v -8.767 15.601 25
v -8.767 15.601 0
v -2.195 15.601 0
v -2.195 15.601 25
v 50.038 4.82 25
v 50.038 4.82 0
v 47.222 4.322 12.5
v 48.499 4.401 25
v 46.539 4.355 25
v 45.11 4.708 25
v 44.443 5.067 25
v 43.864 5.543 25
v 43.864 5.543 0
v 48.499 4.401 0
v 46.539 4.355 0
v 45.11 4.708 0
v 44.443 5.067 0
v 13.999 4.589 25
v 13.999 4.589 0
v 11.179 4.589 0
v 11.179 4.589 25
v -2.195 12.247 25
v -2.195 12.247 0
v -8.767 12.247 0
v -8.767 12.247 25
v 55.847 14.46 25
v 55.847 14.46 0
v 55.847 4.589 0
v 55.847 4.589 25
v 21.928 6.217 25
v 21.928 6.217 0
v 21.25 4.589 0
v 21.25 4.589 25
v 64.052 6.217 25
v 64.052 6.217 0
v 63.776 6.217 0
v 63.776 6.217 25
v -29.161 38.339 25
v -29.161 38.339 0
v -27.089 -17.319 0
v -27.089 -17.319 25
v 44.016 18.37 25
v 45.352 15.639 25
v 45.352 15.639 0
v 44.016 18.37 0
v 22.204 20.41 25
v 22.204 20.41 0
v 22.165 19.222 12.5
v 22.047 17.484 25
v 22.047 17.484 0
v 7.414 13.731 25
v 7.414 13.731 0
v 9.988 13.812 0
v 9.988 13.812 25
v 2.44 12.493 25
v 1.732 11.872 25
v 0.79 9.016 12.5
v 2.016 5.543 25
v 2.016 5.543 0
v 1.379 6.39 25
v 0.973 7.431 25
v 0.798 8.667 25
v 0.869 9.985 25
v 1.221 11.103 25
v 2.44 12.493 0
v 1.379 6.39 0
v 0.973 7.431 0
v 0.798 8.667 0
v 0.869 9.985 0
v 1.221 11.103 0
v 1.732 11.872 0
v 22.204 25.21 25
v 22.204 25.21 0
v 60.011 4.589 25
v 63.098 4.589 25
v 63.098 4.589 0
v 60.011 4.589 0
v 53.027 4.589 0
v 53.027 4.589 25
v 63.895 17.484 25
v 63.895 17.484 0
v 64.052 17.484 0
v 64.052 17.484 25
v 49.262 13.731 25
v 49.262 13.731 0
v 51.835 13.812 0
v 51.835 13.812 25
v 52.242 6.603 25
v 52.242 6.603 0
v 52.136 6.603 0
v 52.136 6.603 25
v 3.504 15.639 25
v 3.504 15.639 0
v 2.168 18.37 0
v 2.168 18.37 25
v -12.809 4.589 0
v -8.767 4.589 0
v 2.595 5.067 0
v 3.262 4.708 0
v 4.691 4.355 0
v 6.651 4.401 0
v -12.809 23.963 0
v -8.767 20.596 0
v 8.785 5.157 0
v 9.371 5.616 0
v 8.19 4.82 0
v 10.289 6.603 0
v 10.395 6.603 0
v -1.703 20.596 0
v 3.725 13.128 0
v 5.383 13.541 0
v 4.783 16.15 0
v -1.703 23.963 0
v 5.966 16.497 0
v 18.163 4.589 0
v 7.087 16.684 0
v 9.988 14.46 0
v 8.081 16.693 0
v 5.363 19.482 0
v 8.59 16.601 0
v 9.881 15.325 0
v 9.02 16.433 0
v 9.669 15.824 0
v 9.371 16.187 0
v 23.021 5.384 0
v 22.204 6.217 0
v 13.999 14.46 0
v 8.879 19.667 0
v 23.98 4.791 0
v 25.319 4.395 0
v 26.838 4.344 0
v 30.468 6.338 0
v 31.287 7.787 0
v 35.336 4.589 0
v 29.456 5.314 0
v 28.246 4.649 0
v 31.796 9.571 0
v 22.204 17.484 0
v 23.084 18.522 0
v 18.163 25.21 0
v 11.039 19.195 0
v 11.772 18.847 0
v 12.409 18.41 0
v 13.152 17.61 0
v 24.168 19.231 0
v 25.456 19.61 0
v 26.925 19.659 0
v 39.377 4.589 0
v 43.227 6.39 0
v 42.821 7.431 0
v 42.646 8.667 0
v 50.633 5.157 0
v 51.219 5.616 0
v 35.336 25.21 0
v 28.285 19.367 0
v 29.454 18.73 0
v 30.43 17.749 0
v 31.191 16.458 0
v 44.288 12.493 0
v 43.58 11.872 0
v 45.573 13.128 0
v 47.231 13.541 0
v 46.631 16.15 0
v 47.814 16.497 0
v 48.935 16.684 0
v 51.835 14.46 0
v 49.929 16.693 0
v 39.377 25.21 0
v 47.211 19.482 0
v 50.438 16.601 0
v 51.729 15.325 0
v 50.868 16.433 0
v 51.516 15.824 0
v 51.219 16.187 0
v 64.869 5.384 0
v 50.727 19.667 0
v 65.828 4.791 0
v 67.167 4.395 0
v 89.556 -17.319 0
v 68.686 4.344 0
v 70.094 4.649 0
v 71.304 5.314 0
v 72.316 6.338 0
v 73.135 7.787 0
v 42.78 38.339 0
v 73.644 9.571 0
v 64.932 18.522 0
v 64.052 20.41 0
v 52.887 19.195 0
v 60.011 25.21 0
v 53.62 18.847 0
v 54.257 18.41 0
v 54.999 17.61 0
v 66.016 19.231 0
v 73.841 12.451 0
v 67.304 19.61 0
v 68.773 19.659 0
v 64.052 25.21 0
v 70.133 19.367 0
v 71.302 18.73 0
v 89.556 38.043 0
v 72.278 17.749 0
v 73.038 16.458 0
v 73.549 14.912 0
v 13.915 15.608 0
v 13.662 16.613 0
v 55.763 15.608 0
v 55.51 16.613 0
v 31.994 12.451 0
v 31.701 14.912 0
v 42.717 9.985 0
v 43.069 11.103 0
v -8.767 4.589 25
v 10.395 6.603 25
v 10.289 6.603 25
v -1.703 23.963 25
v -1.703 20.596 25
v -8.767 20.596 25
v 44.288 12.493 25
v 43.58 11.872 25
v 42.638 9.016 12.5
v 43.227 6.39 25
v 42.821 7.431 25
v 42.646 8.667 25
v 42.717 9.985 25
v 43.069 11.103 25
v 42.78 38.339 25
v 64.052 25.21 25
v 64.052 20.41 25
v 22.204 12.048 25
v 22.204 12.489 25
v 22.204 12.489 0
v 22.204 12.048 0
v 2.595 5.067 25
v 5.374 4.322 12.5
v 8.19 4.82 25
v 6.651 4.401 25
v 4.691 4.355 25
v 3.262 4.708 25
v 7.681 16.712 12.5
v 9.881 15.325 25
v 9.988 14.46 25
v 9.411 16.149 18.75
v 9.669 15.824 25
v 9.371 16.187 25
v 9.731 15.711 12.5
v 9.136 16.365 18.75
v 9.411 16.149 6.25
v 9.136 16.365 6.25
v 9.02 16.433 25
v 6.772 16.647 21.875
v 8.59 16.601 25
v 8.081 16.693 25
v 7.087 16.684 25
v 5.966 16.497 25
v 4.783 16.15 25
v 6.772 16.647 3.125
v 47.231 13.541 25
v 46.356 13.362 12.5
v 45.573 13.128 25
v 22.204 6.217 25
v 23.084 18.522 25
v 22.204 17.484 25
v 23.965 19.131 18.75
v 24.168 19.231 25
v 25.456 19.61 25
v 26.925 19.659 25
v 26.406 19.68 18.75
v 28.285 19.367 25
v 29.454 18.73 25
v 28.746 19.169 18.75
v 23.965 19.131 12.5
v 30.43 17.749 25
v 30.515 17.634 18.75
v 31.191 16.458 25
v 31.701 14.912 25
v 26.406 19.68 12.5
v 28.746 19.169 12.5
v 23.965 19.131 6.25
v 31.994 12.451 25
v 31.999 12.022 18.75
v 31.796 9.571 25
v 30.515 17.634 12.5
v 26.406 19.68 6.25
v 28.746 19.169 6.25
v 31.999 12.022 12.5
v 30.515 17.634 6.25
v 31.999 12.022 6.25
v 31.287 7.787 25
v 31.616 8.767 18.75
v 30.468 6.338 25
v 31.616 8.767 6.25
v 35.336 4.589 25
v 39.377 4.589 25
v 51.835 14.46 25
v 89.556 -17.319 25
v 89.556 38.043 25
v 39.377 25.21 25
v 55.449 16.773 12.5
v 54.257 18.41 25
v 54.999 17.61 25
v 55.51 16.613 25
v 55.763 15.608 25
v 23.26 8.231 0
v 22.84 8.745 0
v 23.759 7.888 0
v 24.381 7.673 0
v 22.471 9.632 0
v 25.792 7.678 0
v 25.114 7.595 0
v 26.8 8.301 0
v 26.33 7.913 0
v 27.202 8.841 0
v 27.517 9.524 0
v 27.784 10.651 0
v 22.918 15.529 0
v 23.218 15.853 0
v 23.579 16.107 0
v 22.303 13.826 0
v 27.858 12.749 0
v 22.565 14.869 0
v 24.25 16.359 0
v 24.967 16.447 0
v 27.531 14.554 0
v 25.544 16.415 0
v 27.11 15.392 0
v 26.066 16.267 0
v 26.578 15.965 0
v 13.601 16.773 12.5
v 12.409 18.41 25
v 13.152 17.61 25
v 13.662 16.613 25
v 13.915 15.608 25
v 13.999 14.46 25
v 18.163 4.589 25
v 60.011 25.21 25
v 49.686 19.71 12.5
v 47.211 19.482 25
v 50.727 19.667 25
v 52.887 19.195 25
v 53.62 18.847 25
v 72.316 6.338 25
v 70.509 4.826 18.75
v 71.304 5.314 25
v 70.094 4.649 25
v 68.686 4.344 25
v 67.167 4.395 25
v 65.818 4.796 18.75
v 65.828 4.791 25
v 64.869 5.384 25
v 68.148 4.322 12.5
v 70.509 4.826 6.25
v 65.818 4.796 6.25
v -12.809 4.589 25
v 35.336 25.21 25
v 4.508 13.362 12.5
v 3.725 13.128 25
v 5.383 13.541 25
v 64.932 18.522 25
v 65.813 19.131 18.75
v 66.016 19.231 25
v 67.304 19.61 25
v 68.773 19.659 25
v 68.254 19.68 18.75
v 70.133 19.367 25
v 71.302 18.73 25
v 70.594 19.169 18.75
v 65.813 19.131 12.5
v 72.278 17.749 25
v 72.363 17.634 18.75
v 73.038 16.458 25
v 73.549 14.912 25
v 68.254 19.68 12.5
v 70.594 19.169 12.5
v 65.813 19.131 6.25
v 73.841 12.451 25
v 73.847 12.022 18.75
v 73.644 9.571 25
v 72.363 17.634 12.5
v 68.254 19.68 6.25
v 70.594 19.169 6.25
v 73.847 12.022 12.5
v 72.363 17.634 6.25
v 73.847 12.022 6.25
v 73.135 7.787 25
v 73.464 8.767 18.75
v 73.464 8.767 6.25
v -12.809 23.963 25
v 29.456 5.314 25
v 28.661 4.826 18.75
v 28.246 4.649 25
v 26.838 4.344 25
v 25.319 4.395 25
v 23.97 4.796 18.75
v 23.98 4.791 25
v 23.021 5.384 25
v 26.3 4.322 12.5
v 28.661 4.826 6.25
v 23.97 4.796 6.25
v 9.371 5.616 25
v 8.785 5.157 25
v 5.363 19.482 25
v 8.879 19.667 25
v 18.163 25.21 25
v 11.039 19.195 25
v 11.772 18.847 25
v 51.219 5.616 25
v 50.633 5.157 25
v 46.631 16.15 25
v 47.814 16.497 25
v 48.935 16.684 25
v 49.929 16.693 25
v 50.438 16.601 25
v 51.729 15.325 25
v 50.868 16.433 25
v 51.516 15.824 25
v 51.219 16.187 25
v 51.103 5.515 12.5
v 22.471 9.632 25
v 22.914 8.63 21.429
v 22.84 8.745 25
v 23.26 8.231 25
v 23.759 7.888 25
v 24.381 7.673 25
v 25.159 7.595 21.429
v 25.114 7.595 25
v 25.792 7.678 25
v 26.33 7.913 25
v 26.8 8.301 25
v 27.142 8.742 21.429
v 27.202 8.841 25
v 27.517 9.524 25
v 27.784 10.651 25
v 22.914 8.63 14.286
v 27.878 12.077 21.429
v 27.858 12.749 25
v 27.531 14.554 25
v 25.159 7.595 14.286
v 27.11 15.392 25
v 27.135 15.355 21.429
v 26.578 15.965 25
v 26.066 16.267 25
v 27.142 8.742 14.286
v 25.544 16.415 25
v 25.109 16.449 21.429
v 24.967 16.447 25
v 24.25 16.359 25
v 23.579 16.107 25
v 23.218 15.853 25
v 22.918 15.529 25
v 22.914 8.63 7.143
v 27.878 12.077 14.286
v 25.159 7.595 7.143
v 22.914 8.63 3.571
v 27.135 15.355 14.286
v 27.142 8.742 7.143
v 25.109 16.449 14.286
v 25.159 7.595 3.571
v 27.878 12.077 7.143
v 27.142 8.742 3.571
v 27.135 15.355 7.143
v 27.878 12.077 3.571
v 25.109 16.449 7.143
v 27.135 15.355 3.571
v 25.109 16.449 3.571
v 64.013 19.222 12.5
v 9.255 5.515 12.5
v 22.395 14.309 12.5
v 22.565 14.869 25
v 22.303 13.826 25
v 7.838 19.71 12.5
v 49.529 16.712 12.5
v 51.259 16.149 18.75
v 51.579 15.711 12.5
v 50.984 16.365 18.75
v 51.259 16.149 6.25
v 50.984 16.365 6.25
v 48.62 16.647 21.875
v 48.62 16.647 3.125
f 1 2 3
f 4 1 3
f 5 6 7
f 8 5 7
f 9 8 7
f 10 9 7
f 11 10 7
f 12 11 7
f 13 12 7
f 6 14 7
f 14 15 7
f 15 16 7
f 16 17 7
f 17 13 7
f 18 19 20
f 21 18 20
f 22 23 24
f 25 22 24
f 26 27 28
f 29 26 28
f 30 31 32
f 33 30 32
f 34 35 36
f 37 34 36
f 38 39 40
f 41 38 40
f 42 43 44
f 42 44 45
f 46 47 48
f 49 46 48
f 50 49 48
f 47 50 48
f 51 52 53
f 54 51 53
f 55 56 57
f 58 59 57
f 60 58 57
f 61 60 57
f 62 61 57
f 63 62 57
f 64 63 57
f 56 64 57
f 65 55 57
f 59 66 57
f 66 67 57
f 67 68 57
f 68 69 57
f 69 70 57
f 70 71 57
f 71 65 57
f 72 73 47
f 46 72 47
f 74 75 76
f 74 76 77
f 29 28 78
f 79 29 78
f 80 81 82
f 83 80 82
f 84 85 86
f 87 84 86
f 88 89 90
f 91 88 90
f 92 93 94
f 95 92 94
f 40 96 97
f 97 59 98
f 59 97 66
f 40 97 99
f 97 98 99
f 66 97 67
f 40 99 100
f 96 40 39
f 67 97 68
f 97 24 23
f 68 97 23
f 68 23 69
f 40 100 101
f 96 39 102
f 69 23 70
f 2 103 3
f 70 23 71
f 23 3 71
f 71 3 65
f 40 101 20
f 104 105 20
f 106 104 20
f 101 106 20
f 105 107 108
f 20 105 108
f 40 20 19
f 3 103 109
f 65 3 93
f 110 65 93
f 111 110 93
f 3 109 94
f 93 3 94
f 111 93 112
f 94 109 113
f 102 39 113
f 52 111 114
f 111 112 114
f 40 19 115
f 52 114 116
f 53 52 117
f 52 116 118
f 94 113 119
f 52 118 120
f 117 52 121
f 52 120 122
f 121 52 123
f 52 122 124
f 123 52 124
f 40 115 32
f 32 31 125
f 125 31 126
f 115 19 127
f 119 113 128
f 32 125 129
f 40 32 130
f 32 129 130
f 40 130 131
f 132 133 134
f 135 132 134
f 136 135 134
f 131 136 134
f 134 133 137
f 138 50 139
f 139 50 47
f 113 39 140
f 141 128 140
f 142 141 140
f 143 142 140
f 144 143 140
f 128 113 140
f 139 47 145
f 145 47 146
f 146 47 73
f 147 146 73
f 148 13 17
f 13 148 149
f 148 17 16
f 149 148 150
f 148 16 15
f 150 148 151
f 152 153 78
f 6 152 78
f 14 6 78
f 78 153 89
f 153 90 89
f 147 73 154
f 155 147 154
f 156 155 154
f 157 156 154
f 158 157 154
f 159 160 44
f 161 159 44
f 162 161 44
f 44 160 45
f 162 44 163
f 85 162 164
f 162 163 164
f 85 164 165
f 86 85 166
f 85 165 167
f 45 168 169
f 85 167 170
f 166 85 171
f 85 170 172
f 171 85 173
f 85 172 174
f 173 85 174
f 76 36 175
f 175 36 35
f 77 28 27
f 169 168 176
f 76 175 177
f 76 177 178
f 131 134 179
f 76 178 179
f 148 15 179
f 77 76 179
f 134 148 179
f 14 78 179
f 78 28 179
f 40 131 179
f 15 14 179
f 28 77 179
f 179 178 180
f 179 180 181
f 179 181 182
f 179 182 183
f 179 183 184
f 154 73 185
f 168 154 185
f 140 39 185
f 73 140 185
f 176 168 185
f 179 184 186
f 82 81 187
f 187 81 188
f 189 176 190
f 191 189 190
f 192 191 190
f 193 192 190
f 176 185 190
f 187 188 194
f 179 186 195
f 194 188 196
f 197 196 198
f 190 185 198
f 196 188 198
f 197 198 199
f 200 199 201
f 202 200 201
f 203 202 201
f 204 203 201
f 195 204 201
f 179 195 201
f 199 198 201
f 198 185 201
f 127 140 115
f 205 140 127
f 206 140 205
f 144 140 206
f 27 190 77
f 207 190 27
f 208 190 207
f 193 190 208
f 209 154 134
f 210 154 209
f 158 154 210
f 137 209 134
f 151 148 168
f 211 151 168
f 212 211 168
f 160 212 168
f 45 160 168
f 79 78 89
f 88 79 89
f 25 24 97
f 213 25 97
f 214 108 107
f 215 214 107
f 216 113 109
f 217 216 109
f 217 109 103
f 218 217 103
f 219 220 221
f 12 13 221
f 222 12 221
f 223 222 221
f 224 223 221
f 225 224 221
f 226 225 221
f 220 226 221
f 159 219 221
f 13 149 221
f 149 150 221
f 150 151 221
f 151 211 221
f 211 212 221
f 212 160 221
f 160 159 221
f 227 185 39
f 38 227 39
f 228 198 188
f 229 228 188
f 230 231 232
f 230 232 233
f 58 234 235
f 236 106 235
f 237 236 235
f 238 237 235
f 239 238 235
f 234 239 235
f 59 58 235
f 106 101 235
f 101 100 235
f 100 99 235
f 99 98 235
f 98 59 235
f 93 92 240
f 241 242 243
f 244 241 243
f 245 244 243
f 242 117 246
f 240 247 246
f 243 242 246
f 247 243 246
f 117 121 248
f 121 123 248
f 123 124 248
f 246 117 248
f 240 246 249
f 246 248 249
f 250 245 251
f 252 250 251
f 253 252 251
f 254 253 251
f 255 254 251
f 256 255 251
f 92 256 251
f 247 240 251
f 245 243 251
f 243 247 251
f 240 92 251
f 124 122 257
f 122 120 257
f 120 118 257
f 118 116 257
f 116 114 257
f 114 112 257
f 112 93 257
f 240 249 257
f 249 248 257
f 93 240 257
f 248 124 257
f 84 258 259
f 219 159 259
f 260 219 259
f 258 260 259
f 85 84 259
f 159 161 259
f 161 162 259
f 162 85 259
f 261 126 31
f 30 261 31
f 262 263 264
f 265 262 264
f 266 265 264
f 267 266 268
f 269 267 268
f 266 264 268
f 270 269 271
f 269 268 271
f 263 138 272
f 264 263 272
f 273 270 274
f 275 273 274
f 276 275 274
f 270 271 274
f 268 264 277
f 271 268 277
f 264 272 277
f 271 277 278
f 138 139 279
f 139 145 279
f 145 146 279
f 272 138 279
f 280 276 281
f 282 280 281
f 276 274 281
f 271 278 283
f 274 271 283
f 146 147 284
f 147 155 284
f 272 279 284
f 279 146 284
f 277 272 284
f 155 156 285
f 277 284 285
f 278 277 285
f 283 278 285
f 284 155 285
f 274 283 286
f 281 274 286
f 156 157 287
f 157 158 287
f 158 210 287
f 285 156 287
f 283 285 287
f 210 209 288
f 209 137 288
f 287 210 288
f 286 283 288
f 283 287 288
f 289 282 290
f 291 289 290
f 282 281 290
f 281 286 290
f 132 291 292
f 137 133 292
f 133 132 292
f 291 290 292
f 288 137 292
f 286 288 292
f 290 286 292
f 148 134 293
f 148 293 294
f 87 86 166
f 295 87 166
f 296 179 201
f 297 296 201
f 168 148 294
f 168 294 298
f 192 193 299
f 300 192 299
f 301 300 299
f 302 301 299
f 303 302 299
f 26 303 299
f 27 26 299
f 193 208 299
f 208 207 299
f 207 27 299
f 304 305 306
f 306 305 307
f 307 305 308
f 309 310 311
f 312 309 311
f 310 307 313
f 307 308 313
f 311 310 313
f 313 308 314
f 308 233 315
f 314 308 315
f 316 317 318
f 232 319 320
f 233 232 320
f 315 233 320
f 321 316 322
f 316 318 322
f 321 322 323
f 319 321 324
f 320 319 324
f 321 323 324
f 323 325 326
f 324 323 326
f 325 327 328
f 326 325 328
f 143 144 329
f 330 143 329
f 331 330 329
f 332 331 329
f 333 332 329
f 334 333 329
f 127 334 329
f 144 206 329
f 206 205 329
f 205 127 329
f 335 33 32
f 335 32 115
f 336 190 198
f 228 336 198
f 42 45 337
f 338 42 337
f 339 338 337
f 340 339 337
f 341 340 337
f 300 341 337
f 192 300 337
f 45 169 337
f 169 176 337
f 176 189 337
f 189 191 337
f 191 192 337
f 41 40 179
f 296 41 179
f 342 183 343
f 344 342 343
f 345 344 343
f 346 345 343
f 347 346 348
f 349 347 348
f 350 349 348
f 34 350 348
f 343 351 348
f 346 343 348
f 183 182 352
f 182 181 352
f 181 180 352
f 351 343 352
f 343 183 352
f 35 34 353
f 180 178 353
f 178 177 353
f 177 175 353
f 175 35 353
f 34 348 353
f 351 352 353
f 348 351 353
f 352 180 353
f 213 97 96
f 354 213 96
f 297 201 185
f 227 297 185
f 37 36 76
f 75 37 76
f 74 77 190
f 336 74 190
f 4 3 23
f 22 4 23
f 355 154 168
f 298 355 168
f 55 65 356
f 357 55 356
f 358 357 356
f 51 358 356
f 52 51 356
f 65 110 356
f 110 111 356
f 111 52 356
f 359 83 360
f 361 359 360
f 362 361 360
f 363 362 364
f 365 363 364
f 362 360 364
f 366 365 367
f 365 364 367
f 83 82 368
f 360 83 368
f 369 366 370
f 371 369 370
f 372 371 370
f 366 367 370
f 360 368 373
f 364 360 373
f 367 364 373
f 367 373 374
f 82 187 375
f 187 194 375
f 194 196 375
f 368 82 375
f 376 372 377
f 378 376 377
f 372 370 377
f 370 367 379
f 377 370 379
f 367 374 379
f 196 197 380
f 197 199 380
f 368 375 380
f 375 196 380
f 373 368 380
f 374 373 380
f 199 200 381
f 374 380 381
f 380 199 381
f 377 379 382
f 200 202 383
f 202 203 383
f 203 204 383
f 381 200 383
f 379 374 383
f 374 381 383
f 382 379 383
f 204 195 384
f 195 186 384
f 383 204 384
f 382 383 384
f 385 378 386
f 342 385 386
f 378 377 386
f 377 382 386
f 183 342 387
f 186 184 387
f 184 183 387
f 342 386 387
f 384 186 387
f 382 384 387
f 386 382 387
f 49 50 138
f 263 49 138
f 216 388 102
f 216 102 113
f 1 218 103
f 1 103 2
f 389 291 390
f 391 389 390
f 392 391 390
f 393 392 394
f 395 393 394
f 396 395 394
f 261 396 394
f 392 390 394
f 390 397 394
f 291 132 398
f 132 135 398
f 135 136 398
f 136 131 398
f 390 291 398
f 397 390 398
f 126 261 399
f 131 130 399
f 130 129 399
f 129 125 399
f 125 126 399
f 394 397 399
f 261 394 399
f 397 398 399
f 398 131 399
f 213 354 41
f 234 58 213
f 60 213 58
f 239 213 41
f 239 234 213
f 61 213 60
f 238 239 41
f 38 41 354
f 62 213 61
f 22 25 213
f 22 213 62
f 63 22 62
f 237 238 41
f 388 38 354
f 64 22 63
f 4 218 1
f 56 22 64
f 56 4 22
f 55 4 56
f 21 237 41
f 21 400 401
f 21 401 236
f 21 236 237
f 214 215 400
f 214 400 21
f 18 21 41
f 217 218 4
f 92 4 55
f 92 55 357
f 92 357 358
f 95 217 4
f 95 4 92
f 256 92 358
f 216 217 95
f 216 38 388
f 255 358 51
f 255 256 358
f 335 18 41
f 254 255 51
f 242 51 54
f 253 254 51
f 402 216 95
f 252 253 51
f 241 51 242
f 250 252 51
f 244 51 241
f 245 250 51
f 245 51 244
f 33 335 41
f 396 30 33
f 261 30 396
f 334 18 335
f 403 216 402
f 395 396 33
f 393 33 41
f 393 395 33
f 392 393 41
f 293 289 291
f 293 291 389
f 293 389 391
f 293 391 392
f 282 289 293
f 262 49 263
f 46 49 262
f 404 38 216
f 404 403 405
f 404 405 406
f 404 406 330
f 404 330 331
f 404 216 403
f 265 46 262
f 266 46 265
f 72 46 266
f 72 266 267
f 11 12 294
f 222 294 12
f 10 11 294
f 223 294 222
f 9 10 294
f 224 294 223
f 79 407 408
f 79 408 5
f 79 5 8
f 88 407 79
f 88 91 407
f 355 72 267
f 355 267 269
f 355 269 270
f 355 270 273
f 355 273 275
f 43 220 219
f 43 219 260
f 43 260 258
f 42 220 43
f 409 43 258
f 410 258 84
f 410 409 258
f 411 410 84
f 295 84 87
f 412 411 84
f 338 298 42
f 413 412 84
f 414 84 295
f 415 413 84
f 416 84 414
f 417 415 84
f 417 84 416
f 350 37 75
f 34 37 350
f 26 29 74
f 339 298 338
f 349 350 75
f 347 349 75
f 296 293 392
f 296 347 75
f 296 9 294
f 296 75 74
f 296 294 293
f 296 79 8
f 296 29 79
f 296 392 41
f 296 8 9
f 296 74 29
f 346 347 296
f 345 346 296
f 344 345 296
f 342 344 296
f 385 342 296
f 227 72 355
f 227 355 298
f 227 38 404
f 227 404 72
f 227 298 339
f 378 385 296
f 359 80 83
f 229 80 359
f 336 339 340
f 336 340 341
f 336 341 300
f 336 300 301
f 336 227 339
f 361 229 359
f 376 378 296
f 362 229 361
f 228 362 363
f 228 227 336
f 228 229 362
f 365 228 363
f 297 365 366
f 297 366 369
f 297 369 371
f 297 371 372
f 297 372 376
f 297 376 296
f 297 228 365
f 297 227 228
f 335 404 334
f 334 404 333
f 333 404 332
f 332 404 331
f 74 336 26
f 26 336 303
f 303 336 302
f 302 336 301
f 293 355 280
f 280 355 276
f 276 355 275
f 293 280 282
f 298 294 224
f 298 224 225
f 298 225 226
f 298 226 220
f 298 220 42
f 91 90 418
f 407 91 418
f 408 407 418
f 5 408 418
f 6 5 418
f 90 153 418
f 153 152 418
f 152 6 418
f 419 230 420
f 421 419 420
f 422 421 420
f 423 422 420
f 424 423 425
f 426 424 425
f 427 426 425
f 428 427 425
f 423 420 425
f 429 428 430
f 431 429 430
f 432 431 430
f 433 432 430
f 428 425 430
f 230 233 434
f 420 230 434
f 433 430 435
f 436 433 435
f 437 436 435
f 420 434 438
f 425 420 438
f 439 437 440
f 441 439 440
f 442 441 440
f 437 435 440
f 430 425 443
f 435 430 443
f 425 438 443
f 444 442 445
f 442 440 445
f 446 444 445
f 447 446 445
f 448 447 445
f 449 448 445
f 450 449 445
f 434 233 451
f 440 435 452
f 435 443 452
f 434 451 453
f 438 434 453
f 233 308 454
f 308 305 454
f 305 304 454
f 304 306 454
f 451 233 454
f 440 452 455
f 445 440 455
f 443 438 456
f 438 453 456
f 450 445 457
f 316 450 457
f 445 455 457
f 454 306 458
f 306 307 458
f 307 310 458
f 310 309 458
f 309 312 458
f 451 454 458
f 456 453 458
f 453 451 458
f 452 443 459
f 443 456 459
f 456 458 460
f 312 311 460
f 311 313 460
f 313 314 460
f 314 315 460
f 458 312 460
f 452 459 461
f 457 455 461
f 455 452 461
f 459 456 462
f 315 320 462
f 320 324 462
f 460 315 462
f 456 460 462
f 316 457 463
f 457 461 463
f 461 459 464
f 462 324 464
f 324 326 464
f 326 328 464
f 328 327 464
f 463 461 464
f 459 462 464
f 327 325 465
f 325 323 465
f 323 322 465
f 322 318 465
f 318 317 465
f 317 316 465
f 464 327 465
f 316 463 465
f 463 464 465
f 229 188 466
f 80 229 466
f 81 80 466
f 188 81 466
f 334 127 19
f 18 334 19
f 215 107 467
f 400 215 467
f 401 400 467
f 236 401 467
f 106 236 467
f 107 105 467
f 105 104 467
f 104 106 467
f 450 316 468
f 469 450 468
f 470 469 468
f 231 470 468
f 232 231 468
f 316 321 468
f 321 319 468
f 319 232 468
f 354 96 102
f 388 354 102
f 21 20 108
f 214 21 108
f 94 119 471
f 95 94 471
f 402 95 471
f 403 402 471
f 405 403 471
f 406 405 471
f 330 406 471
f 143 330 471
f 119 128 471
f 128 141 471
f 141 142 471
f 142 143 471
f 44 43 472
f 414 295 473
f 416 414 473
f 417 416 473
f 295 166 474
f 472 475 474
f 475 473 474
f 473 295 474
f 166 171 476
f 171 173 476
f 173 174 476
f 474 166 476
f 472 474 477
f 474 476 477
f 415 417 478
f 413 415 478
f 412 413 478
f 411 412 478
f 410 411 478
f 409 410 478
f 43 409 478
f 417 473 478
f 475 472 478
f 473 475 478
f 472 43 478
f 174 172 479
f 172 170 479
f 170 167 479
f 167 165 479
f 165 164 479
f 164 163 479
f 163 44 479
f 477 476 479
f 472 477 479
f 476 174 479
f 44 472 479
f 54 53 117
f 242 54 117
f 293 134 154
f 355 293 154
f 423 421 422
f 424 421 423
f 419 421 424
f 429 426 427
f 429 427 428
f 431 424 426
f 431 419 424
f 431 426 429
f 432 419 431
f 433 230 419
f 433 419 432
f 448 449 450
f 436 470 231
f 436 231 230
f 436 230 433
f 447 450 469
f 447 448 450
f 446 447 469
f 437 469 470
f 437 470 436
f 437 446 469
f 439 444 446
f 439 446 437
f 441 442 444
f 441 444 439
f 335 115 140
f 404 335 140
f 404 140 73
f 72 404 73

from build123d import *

# Parameters (mm, degrees)
F0_W     = 4.0410413984
F0_H     = 20.6207600425
F1_DEPTH = 25


with BuildPart() as f1:
    # F0 (on Top) → F1 (new body)
    with BuildSketch(Plane.XY):
        Polygon((42.779609561, 38.338817656), (-29.1611850262, 38.338817656), (-27.088817209, -17.3190794885), (42.779609561, -17.3190794885), (89.5559191704, -17.3190794885), (89.5559191704, 38.0427651107), align=None)
        Polygon((-8.7674763547, 12.2468649212), (-8.7674763547, 4.5888158493), (-12.8085177531, 4.5888158493), (-12.8085177531, 23.9629167406), (-1.7030744976, 23.9629167406), (-1.7030744976, 20.5960889647), (-8.7674763547, 20.5960889647), (-8.7674763547, 15.6009716853), (-2.1949536185, 15.6009716853), (-2.1949536185, 12.2468649212), align=None, mode=Mode.SUBTRACT)
        with BuildLine():
            Line((13.9988943359, 4.5888158493), (11.1790700652, 4.5888158493))
            Line((11.1790700652, 4.5888158493), (10.3946076741, 6.6029760426))
            Line((10.3946076741, 6.6029760426), (10.2885992429, 6.6029760426))
            add(Edge.make_bspline(
                [(10.2885992429, 6.6029760426), (9.2709183031, 5.3181538561), (8.1896323046, 4.8199142294)],
                knots=[0, 0, 0, 1, 1, 1], degree=2))
            add(Edge.make_bspline(
                [(8.1896323046, 4.8199142294), (7.1083463061, 4.3216746026), (5.3740483712, 4.3216746026)],
                knots=[0, 0, 0, 1, 1, 1], degree=2))
            add(Edge.make_bspline(
                [(5.3740483712, 4.3216746026), (3.2411587349, 4.3216746026), (2.0157012699, 5.5428917303)],
                knots=[0, 0, 0, 1, 1, 1], degree=2))
            add(Edge.make_bspline(
                [(2.0157012699, 5.5428917303), (0.7902438049, 6.7641088581), (0.7902438049, 9.0157279374)],
                knots=[0, 0, 0, 1, 1, 1], degree=2))
            add(Edge.make_bspline(
                [(0.7902438049, 9.0157279374), (0.7902438049, 11.3733554479), (2.4397349948, 12.4928044817)],
                knots=[0, 0, 0, 1, 1, 1], degree=2))
            add(Edge.make_bspline(
                [(2.4397349948, 12.4928044817), (4.0892261847, 13.6122535154), (7.413650588, 13.7309829584)],
                knots=[0, 0, 0, 1, 1, 1], degree=2))
            Line((7.413650588, 13.7309829584), (9.9875352982, 13.8115493661))
            Line((9.9875352982, 13.8115493661), (9.9875352982, 14.4603209653))
            add(Edge.make_bspline(
                [(9.9875352982, 14.4603209653), (9.9875352982, 16.7119400445), (7.6807918347, 16.7119400445)],
                knots=[0, 0, 0, 1, 1, 1], degree=2))
            add(Edge.make_bspline(
                [(7.6807918347, 16.7119400445), (5.9040905273, 16.7119400445), (3.5040596443, 15.6391347205)],
                knots=[0, 0, 0, 1, 1, 1], degree=2))
            Line((3.5040596443, 15.6391347205), (2.1683534108, 18.3699119089))
            add(Edge.make_bspline(
                [(2.1683534108, 18.3699119089), (4.7252767721, 19.7098584797), (7.8376843129, 19.7098584797)],
                knots=[0, 0, 0, 1, 1, 1], degree=2))
            add(Edge.make_bspline(
                [(7.8376843129, 19.7098584797), (10.8186413991, 19.7098584797), (12.4087678675, 18.4101951128)],
                knots=[0, 0, 0, 1, 1, 1], degree=2))
            add(Edge.make_bspline(
                [(12.4087678675, 18.4101951128), (13.9988943359, 17.110531746), (13.9988943359, 14.4603209653)],
                knots=[0, 0, 0, 1, 1, 1], degree=2))
            Line((13.9988943359, 14.4603209653), (13.9988943359, 4.5888158493))
        make_face(mode=Mode.SUBTRACT)
        with BuildLine():
            add(Edge.make_bspline(
                [(22.203946913, 17.4836814239), (23.6244598914, 19.6801761189), (26.4061211269, 19.6801761189)],
                knots=[0, 0, 0, 1, 1, 1], degree=2))
            add(Edge.make_bspline(
                [(26.4061211269, 19.6801761189), (29.0308898841, 19.6801761189), (30.5150079213, 17.6342133962)],
                knots=[0, 0, 0, 1, 1, 1], degree=2))
            add(Edge.make_bspline(
                [(30.5150079213, 17.6342133962), (31.9991259585, 15.5882506735), (31.9991259585, 12.022127047)],
                knots=[0, 0, 0, 1, 1, 1], degree=2))
            add(Edge.make_bspline(
                [(31.9991259585, 12.022127047), (31.9991259585, 8.3542353265), (30.4683642115, 6.3379549645)],
                knots=[0, 0, 0, 1, 1, 1], degree=2))
            add(Edge.make_bspline(
                [(30.4683642115, 6.3379549645), (28.9376024646, 4.3216746026), (26.3001126956, 4.3216746026)],
                knots=[0, 0, 0, 1, 1, 1], degree=2))
            add(Edge.make_bspline(
                [(26.3001126956, 4.3216746026), (23.6880649502, 4.3216746026), (22.203946913, 6.2171053529)],
                knots=[0, 0, 0, 1, 1, 1], degree=2))
            Line((22.203946913, 6.2171053529), (21.9283249918, 6.2171053529))
            Line((21.9283249918, 6.2171053529), (21.2498710319, 4.5888158493))
            Line((21.2498710319, 4.5888158493), (18.1629055145, 4.5888158493))
            Line((18.1629055145, 4.5888158493), (18.1629055145, 25.2095758918))
            Line((18.1629055145, 25.2095758918), (22.203946913, 25.2095758918))
            Line((22.203946913, 25.2095758918), (22.203946913, 20.4095141258))
            add(Edge.make_bspline(
                [(22.203946913, 20.4095141258), (22.203946913, 19.4978416172), (22.0470544348, 17.4836814239)],
                knots=[0, 0, 0, 1, 1, 1], degree=2))
            Line((22.0470544348, 17.4836814239), (22.203946913, 17.4836814239))
        make_face(mode=Mode.SUBTRACT)
        with Locations((37.3567920727, 14.8991958705)):
            Rectangle(F0_W, F0_H, mode=Mode.SUBTRACT)
        with BuildLine():
            Line((55.8467826476, 4.5888158493), (53.0269583769, 4.5888158493))
            Line((53.0269583769, 4.5888158493), (52.2424959858, 6.6029760426))
            Line((52.2424959858, 6.6029760426), (52.1364875546, 6.6029760426))
            add(Edge.make_bspline(
                [(52.1364875546, 6.6029760426), (51.1188066148, 5.3181538561), (50.0375206163, 4.8199142294)],
                knots=[0, 0, 0, 1, 1, 1], degree=2))
            add(Edge.make_bspline(
                [(50.0375206163, 4.8199142294), (48.9562346177, 4.3216746026), (47.2219366828, 4.3216746026)],
                knots=[0, 0, 0, 1, 1, 1], degree=2))
            add(Edge.make_bspline(
                [(47.2219366828, 4.3216746026), (45.0890470465, 4.3216746026), (43.8635895815, 5.5428917303)],
                knots=[0, 0, 0, 1, 1, 1], degree=2))
            add(Edge.make_bspline(
                [(43.8635895815, 5.5428917303), (42.6381321165, 6.7641088581), (42.6381321165, 9.0157279374)],
                knots=[0, 0, 0, 1, 1, 1], degree=2))
            add(Edge.make_bspline(
                [(42.6381321165, 9.0157279374), (42.6381321165, 11.3733554479), (44.2876233064, 12.4928044817)],
                knots=[0, 0, 0, 1, 1, 1], degree=2))
            add(Edge.make_bspline(
                [(44.2876233064, 12.4928044817), (45.9371144964, 13.6122535154), (49.2615388997, 13.7309829584)],
                knots=[0, 0, 0, 1, 1, 1], degree=2))
            Line((49.2615388997, 13.7309829584), (51.8354236099, 13.8115493661))
            Line((51.8354236099, 13.8115493661), (51.8354236099, 14.4603209653))
            add(Edge.make_bspline(
                [(51.8354236099, 14.4603209653), (51.8354236099, 16.7119400445), (49.5286801464, 16.7119400445)],
                knots=[0, 0, 0, 1, 1, 1], degree=2))
            add(Edge.make_bspline(
                [(49.5286801464, 16.7119400445), (47.751978839, 16.7119400445), (45.351947956, 15.6391347205)],
                knots=[0, 0, 0, 1, 1, 1], degree=2))
            Line((45.351947956, 15.6391347205), (44.0162417225, 18.3699119089))
            add(Edge.make_bspline(
                [(44.0162417225, 18.3699119089), (46.5731650837, 19.7098584797), (49.6855726246, 19.7098584797)],
                knots=[0, 0, 0, 1, 1, 1], degree=2))
            add(Edge.make_bspline(
                [(49.6855726246, 19.7098584797), (52.6665297107, 19.7098584797), (54.2566561792, 18.4101951128)],
                knots=[0, 0, 0, 1, 1, 1], degree=2))
            add(Edge.make_bspline(
                [(54.2566561792, 18.4101951128), (55.8467826476, 17.110531746), (55.8467826476, 14.4603209653)],
                knots=[0, 0, 0, 1, 1, 1], degree=2))
            Line((55.8467826476, 14.4603209653), (55.8467826476, 4.5888158493))
        make_face(mode=Mode.SUBTRACT)
        with BuildLine():
            add(Edge.make_bspline(
                [(64.0518352246, 17.4836814239), (65.4723482031, 19.6801761189), (68.2540094385, 19.6801761189)],
                knots=[0, 0, 0, 1, 1, 1], degree=2))
            add(Edge.make_bspline(
                [(68.2540094385, 19.6801761189), (70.8787781957, 19.6801761189), (72.3628962329, 17.6342133962)],
                knots=[0, 0, 0, 1, 1, 1], degree=2))
            add(Edge.make_bspline(
                [(72.3628962329, 17.6342133962), (73.8470142701, 15.5882506735), (73.8470142701, 12.022127047)],
                knots=[0, 0, 0, 1, 1, 1], degree=2))
            add(Edge.make_bspline(
                [(73.8470142701, 12.022127047), (73.8470142701, 8.3542353265), (72.3162525232, 6.3379549645)],
                knots=[0, 0, 0, 1, 1, 1], degree=2))
            add(Edge.make_bspline(
                [(72.3162525232, 6.3379549645), (70.7854907763, 4.3216746026), (68.1480010073, 4.3216746026)],
                knots=[0, 0, 0, 1, 1, 1], degree=2))
            add(Edge.make_bspline(
                [(68.1480010073, 4.3216746026), (65.5359532618, 4.3216746026), (64.0518352246, 6.2171053529)],
                knots=[0, 0, 0, 1, 1, 1], degree=2))
            Line((64.0518352246, 6.2171053529), (63.7762133035, 6.2171053529))
            Line((63.7762133035, 6.2171053529), (63.0977593436, 4.5888158493))
            Line((63.0977593436, 4.5888158493), (60.0107938262, 4.5888158493))
            Line((60.0107938262, 4.5888158493), (60.0107938262, 25.2095758918))
            Line((60.0107938262, 25.2095758918), (64.0518352246, 25.2095758918))
            Line((64.0518352246, 25.2095758918), (64.0518352246, 20.4095141258))
            add(Edge.make_bspline(
                [(64.0518352246, 20.4095141258), (64.0518352246, 19.4978416172), (63.8949427464, 17.4836814239)],
                knots=[0, 0, 0, 1, 1, 1], degree=2))
            Line((63.8949427464, 17.4836814239), (64.0518352246, 17.4836814239))
        make_face(mode=Mode.SUBTRACT)
    extrude(amount=F1_DEPTH)


with BuildPart() as f1b:
    # F0 (on Top) → F1, piece 2 (new body)
    with BuildSketch(Plane.XY):
        with BuildLine():
            add(Edge.make_bspline(
                [(27.1354591337, 15.3550321248), (26.3934001151, 16.4490391351), (25.1085779286, 16.4490391351)],
                knots=[0, 0, 0, 1, 1, 1], degree=2))
            add(Edge.make_bspline(
                [(25.1085779286, 16.4490391351), (23.6074985424, 16.4490391351), (22.9184437395, 15.528885952)],
                knots=[0, 0, 0, 1, 1, 1], degree=2))
            add(Edge.make_bspline(
                [(22.9184437395, 15.528885952), (22.2293889365, 14.608732769), (22.203946913, 12.4885641444)],
                knots=[0, 0, 0, 1, 1, 1], degree=2))
            Line((22.203946913, 12.4885641444), (22.203946913, 12.0475690705))
            add(Edge.make_bspline(
                [(22.203946913, 12.0475690705), (22.203946913, 9.6644995365), (22.9142034022, 8.6298572477)],
                knots=[0, 0, 0, 1, 1, 1], degree=2))
            add(Edge.make_bspline(
                [(22.9142034022, 8.6298572477), (23.6244598914, 7.5952149589), (25.1594619756, 7.5952149589)],
                knots=[0, 0, 0, 1, 1, 1], degree=2))
            add(Edge.make_bspline(
                [(25.1594619756, 7.5952149589), (26.4061211269, 7.5952149589), (27.1418196396, 8.7422261848)],
                knots=[0, 0, 0, 1, 1, 1], degree=2))
            add(Edge.make_bspline(
                [(27.1418196396, 8.7422261848), (27.8775181523, 9.8892374107), (27.8775181523, 12.0772514312)],
                knots=[0, 0, 0, 1, 1, 1], degree=2))
            add(Edge.make_bspline(
                [(27.8775181523, 12.0772514312), (27.8775181523, 14.2610251145), (27.1354591337, 15.3550321248)],
                knots=[0, 0, 0, 1, 1, 1], degree=2))
        make_face()
    extrude(amount=F1_DEPTH)


solid = Compound([f1.part, f1b.part])
